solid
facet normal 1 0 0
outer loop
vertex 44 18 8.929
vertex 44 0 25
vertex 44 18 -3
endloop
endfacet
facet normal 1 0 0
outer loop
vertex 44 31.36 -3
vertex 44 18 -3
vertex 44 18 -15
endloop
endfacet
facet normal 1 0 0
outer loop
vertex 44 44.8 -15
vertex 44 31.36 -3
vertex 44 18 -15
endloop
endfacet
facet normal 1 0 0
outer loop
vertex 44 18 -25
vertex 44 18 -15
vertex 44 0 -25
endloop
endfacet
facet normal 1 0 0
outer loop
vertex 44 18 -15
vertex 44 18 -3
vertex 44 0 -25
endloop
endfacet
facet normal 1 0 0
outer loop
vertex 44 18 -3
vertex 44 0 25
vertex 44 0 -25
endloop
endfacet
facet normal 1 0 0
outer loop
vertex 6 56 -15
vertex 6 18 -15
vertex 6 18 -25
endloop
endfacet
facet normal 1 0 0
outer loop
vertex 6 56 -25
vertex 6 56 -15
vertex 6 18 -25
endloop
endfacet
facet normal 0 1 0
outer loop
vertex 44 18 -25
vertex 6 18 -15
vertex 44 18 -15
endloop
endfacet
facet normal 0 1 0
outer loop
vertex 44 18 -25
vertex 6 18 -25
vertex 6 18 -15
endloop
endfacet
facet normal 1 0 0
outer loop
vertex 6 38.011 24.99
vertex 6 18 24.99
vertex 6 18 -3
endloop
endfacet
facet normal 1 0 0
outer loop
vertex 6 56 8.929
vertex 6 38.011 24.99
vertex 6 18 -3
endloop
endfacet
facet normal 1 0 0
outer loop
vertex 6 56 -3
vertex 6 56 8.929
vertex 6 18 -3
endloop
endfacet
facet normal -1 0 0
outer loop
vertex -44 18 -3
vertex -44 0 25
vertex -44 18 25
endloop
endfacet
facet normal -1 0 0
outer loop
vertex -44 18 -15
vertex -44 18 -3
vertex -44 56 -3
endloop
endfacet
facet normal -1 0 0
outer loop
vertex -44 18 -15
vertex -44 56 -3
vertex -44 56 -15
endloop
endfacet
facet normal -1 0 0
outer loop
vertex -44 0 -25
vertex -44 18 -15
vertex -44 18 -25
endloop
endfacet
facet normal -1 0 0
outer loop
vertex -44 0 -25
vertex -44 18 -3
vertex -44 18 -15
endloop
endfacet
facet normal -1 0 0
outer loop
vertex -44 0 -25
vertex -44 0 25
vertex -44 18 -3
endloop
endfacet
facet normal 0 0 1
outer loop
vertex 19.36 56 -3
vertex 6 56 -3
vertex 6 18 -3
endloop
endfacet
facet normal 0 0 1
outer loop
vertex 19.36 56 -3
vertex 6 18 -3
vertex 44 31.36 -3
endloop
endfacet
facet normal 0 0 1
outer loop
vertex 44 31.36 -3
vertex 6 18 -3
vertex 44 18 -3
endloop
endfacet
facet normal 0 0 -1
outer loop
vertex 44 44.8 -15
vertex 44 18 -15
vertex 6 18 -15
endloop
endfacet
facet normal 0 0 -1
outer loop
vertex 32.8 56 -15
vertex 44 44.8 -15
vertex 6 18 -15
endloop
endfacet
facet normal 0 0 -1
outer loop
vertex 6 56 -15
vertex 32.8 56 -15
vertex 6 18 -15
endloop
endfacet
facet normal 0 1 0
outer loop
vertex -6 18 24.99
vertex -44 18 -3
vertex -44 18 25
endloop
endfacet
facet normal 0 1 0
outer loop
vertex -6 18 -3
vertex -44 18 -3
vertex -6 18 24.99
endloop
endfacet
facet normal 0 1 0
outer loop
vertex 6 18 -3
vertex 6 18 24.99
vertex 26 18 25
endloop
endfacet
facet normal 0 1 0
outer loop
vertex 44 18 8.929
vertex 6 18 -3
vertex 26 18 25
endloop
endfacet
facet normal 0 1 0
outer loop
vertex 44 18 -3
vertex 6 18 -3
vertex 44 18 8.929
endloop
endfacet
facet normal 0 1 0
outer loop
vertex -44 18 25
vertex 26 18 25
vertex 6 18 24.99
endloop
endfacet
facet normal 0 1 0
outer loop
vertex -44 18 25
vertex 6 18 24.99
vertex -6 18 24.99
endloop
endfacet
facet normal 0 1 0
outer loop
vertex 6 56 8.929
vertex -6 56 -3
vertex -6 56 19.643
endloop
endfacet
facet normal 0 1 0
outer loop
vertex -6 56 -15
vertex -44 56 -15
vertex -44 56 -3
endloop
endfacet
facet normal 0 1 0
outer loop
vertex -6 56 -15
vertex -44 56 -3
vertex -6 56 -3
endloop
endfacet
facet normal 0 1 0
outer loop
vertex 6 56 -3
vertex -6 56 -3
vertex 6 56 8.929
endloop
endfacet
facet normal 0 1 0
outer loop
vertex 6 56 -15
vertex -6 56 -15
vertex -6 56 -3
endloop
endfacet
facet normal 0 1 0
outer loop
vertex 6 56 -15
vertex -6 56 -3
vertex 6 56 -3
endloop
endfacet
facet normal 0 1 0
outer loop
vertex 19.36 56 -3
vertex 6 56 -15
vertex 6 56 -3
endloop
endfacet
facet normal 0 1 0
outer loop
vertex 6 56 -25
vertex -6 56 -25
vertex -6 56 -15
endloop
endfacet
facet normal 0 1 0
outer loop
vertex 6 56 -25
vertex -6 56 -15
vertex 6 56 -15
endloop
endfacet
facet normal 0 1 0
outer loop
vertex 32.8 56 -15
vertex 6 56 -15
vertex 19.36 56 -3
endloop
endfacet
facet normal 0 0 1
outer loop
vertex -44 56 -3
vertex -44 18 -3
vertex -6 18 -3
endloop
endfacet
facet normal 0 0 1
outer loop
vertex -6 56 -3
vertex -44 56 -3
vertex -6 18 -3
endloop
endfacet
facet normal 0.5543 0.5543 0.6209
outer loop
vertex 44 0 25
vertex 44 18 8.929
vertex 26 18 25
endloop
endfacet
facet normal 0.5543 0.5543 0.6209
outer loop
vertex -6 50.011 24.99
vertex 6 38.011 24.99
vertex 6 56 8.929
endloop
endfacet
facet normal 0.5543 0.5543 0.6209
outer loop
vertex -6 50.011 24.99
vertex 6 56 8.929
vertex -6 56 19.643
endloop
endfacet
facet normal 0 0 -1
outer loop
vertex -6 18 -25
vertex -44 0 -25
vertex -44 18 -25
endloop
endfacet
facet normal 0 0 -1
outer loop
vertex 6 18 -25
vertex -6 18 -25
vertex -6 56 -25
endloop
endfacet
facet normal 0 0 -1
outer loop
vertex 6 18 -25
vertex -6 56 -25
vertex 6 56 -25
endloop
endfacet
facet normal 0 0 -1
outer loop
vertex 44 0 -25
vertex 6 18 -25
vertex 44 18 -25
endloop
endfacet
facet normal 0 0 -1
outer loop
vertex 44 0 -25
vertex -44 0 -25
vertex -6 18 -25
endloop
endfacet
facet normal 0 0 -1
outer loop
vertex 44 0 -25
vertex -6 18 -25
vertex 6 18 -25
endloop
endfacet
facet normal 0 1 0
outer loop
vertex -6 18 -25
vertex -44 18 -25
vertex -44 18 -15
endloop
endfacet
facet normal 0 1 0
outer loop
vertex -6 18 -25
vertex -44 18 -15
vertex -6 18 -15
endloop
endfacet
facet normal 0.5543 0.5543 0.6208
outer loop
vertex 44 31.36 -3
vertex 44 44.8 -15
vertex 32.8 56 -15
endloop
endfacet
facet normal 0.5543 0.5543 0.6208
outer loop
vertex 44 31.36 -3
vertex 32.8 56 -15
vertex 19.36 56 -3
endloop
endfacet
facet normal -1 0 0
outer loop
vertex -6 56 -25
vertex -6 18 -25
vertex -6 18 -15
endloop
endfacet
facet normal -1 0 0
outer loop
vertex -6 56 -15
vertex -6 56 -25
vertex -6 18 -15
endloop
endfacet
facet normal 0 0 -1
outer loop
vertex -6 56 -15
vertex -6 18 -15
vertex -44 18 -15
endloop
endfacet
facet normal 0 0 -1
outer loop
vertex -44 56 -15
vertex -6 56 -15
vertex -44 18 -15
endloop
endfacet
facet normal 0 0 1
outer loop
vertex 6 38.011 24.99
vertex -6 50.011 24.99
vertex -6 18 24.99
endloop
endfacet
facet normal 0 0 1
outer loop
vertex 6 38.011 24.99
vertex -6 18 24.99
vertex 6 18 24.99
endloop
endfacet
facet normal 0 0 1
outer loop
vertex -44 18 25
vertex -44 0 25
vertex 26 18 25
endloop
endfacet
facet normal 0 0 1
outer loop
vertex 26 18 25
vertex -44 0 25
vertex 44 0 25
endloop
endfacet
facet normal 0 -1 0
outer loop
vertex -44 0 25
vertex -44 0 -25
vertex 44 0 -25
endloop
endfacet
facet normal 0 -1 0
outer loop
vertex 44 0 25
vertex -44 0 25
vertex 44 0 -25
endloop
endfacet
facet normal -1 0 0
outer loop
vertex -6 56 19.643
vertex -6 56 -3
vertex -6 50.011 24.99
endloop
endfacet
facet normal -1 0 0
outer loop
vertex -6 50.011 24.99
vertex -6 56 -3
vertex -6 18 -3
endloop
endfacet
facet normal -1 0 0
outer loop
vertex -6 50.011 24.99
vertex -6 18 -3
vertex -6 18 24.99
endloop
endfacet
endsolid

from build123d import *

# Parameters (mm, degrees)
SKETCH1_W           = 88
SKETCH1_H           = 50
BOSS_EXTRUDE1_DEPTH = 18
BOSS_EXTRUDE2_DEPTH = 38
SKETCH5_W           = 74.105007355
SKETCH5_H           = 76.56039949
CUT_EXTRUDE1_DEPTH  = 38


with BuildPart() as part:
    # Sketch1 → Boss-Extrude1 (new body)
    with BuildSketch(Plane(origin=(0, 0, 0), x_dir=(1, 0, 0), z_dir=(0, 1, 0))):
        Rectangle(SKETCH1_W, SKETCH1_H)
    extrude(amount=BOSS_EXTRUDE1_DEPTH)

    # Sketch2 → Boss-Extrude2 (add)
    with BuildSketch(Plane(origin=(0, 18, 0), x_dir=(1, 0, 0), z_dir=(0, 1, 0))):
        Polygon((-44, 3), (-6, 3), (-6, -24.990461848), (6, -24.990461848), (6, 3), (44, 3), (44, 15), (6, 15), (6, 25), (-6, 25), (-6, 15), (-44, 15), align=None)
    extrude(amount=BOSS_EXTRUDE2_DEPTH)

    # Sketch5 → Cut-Extrude1 (cut)
    with BuildSketch(Plane(origin=(22.123893805, 22.123893805, 24.778761062), x_dir=(-0.8323002445923469, 0.36918924973045525, 0.4134919596981098), z_dir=(-0.5543250876981122, -0.5543250876981184, -0.6208440982218917))):
        with Locations((7.332126574, 18.101961107)):
            Rectangle(SKETCH5_W, SKETCH5_H)
    extrude(amount=-CUT_EXTRUDE1_DEPTH, mode=Mode.SUBTRACT)


solid = part.part
